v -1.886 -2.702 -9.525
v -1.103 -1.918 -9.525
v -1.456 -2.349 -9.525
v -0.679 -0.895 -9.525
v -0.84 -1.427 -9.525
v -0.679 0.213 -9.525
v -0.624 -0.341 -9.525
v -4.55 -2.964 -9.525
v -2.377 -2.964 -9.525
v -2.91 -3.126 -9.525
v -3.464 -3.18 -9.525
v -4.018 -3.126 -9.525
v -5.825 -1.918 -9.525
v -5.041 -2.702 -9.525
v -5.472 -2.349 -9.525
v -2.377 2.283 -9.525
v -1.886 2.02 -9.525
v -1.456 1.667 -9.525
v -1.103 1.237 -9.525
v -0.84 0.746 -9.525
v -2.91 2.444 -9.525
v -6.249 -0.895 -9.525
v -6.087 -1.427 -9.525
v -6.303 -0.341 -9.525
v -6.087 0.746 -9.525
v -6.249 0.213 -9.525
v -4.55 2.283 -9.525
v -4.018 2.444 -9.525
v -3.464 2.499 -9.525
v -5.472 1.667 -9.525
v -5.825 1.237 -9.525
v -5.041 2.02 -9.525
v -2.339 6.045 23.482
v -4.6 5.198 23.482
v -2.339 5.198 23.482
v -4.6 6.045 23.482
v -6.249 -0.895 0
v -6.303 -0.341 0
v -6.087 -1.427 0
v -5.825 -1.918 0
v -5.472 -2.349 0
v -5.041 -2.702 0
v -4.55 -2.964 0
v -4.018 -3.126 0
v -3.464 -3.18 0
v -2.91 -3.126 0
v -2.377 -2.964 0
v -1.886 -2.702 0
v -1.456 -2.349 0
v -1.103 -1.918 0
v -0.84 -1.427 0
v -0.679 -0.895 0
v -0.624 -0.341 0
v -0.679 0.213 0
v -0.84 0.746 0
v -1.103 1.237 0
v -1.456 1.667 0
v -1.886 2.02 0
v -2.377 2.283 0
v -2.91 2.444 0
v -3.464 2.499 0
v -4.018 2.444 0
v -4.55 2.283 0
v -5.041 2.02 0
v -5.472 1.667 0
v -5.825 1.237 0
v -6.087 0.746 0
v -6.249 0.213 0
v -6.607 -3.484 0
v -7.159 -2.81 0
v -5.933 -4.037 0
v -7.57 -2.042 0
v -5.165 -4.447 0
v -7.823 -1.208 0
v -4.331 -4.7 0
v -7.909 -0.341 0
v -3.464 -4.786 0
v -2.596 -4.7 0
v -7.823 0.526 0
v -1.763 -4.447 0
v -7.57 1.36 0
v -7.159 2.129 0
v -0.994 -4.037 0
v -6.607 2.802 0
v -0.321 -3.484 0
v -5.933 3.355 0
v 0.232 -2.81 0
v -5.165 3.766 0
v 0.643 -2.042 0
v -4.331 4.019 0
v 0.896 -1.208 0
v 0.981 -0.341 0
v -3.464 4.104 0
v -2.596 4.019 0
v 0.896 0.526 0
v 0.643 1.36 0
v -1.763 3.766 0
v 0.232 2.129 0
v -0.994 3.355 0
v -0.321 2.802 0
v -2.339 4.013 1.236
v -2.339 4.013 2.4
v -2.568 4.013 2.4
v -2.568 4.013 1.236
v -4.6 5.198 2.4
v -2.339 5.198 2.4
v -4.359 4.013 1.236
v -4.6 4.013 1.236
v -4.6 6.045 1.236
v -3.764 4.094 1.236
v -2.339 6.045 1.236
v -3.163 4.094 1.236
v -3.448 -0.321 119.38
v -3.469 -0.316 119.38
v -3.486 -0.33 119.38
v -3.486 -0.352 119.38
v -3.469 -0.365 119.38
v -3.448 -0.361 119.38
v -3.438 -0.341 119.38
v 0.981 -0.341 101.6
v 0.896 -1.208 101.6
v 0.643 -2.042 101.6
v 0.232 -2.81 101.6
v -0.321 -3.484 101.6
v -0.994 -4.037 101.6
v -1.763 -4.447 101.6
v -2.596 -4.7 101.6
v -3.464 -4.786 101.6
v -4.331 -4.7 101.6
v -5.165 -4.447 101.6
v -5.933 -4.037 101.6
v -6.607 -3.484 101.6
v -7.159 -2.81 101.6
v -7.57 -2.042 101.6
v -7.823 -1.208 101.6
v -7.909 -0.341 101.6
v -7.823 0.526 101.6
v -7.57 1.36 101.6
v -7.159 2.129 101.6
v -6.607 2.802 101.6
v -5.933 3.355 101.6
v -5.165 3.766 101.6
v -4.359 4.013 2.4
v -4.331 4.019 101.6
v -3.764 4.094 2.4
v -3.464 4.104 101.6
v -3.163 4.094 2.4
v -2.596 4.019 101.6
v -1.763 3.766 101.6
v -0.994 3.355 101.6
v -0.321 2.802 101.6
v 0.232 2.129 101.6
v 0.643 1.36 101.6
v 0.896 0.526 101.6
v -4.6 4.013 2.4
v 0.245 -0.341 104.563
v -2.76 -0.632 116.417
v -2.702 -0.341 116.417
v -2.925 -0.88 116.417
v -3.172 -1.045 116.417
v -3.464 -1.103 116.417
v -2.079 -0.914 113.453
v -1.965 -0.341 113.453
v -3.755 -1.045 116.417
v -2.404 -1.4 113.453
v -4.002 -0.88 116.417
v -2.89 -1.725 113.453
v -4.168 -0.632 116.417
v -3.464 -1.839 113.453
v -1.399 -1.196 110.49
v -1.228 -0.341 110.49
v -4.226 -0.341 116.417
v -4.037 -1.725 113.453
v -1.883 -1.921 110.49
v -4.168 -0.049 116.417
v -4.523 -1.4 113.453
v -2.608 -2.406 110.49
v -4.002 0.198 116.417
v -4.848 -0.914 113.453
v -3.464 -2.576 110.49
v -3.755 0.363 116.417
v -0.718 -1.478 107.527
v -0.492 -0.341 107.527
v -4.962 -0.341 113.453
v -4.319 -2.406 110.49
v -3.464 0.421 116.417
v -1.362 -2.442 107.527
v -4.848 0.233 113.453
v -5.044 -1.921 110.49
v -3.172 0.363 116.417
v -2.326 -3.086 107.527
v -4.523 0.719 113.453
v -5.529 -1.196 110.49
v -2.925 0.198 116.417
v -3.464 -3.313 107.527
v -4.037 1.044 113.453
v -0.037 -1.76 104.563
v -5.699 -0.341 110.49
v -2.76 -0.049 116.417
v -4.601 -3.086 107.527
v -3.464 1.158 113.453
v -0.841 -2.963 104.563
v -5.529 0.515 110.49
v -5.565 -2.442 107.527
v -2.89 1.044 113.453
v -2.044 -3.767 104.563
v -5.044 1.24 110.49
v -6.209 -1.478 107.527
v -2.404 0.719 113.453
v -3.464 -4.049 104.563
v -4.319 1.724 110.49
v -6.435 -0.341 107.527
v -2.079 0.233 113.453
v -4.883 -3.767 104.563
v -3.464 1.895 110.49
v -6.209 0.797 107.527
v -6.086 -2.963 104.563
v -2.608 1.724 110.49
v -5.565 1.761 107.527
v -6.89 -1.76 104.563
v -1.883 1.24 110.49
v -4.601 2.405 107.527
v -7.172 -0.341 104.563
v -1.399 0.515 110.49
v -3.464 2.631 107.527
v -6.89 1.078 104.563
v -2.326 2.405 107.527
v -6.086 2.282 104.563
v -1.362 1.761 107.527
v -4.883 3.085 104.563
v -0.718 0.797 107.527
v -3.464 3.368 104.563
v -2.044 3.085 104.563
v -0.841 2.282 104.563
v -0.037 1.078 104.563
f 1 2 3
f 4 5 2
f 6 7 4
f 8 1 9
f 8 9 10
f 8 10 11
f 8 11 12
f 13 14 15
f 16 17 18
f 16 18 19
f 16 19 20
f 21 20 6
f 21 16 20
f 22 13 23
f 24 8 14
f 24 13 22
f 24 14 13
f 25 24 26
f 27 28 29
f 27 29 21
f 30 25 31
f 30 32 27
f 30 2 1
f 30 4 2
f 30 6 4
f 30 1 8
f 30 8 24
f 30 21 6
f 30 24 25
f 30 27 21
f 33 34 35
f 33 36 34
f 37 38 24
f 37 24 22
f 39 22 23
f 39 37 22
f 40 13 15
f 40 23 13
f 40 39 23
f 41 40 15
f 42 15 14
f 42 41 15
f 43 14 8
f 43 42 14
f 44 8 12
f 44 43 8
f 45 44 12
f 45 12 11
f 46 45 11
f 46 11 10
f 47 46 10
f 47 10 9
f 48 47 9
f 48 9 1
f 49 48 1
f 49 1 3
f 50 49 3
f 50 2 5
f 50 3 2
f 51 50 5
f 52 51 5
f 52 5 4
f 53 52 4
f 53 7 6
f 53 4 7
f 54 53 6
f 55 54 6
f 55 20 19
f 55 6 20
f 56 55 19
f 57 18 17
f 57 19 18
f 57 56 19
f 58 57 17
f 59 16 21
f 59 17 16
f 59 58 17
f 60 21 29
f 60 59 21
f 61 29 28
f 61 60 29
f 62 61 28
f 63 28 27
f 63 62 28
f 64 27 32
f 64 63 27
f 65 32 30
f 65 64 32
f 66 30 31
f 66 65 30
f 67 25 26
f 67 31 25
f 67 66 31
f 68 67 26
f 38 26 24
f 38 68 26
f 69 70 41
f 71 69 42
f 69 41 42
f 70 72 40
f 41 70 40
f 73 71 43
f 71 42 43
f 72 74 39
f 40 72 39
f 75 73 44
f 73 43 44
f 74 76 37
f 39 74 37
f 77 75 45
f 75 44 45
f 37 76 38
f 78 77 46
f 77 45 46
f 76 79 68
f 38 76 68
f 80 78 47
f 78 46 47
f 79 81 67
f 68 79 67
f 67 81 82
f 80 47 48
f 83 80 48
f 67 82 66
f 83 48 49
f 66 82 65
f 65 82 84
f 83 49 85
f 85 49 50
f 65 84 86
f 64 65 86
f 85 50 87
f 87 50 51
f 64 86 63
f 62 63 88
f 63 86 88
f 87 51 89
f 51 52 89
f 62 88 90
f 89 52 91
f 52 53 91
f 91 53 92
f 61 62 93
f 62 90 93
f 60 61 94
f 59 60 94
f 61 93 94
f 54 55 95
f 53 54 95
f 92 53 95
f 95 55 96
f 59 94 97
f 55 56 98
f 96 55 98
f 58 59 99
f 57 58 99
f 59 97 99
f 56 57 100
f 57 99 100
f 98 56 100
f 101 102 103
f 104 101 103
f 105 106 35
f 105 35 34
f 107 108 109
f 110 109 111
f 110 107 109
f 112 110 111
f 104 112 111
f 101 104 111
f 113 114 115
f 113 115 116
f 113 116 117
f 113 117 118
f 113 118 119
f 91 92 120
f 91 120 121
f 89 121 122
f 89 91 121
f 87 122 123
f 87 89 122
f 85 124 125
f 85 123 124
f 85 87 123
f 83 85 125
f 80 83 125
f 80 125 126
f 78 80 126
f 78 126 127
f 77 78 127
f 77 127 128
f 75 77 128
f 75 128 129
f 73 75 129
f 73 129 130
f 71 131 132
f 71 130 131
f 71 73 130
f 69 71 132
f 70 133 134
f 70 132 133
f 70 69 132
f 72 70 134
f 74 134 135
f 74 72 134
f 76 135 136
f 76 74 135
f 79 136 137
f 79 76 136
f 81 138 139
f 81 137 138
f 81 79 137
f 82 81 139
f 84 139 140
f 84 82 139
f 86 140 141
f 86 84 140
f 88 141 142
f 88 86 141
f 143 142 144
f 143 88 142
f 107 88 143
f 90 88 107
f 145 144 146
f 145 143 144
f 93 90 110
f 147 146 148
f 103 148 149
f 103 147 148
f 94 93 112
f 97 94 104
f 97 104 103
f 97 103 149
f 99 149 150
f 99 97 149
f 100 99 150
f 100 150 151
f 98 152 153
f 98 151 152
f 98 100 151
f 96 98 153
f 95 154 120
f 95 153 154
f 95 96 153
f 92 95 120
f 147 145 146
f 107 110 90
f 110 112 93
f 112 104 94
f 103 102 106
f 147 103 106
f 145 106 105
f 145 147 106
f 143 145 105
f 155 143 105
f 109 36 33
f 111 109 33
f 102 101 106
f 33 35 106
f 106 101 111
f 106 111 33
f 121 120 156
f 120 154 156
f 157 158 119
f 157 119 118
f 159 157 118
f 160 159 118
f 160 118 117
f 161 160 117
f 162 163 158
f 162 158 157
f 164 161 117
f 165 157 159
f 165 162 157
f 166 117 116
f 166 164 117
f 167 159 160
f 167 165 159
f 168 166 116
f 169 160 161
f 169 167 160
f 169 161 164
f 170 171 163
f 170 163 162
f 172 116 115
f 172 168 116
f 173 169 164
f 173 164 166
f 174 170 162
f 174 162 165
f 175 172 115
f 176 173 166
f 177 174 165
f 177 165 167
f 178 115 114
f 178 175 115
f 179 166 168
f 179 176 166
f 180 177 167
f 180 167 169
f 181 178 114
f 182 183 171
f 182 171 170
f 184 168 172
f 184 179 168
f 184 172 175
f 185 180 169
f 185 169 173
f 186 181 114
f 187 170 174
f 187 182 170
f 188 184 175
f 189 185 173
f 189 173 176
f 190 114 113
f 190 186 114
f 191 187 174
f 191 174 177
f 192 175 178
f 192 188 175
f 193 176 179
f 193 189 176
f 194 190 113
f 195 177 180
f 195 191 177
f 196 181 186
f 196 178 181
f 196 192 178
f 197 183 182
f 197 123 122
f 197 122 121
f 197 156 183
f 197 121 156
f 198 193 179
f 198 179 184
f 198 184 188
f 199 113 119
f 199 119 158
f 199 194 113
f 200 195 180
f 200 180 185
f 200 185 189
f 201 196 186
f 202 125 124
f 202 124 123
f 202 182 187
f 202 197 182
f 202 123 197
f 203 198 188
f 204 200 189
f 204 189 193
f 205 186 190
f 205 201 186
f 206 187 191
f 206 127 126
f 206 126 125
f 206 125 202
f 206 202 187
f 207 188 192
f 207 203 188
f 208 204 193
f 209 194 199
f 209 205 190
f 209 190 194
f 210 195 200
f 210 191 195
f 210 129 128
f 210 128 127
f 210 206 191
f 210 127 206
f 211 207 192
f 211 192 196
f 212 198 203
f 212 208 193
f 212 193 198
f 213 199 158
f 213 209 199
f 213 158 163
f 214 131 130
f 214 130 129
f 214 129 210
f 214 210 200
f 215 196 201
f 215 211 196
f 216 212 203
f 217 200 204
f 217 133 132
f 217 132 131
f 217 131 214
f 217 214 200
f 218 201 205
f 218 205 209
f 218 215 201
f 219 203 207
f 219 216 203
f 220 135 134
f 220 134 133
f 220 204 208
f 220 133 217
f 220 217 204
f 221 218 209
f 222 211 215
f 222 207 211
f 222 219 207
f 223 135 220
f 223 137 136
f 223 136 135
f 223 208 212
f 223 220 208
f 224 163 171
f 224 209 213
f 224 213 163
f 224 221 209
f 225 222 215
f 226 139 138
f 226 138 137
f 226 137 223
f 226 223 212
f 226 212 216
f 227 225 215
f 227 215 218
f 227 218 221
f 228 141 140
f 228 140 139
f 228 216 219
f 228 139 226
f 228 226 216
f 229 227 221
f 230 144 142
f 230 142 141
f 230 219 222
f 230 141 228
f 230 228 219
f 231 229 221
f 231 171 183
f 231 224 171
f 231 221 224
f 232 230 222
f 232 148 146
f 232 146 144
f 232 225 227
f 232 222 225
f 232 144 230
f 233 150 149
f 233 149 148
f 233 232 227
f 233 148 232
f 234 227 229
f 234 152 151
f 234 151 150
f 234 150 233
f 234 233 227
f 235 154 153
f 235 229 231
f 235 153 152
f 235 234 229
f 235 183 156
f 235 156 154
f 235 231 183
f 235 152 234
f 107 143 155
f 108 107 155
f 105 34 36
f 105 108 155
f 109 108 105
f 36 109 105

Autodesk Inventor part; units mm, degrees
ref_plane "YZ Plane" through (0, 0, 0) normal (1, 0, 0) x (0, 1, 0)
sketch "Sketch1" plane through (0, 0, 0) normal (0, 0, 1) x (1, 0, 0)
  circle A0 centre (-3.4636, -0.3407) radius 4.445
  point P0 (0, 0)
  dimension "d0" = 8.89
extrude "Pen body" add sketch "Sketch1" along normal blind 101.6
ref_plane "Tip Plane" through (-3.4636, -0.3407, 119.38) normal (0, 0, 1) x (1, 0, 0)
sketch "Sketch2" plane through (-3.4636, -0.3407, 119.38) normal (0, 0, 1) x (1, 0, 0)
  circle A0 centre (0, 0) radius 0.0254
  point P0 (3.4636, 0.3407)
  dimension "d4" = 0.0508
loft "Body to Tip" add profiles "Sketch2" section 1 edges at (-7.9086, -0.3407, 101.6)
sketch "Sketch3" plane through (-3.4636, -0.3407, 0) normal (0, 0, -1) x (-1, 0, 0)
  point P0 (-3.4636, 0.3407)
sketch "Sketch4" plane through (-3.4636, -0.3407, 0) normal (0, 0, -1) x (-1, 0, 0)
  circle A0 centre (0, 0) radius 2.8396
  point P0 (-3.4636, 0.3407)
extrude "Click" add sketch "Sketch4" along normal blind 9.525
ref_plane "Clip" through (0, 4.0132, 0) normal (0, 1, 0) x (-1, 0, 0)
sketch "Clip extention" plane through (0, 4.0132, 0) normal (0, 1, 0) x (-1, 0, 0)
  point P0 (0, 0)
sketch "Clips extension's extension" plane through (0, 4.0132, 0) normal (0, 1, 0) x (-1, 0, 0)
  point P0 (0, 0)
sketch "Sketch7" plane through (0, 4.0132, 0) normal (0, 1, 0) x (-1, 0, 0)
  line L0 (4.5996, 1.2363) -> (2.3394, 1.2363)
  line L1 (2.3394, 1.2363) -> (2.3394, 2.4001)
  line L2 (2.3394, 2.4001) -> (4.5996, 2.4001)
  line L3 (4.5996, 2.4001) -> (4.5996, 1.2363)
  point P0 (0, 0)
extrude "Extrusion3" add sketch "Sketch7" along normal blind 2.032
sketch "Sketch8" plane through (-4.5996, 4.0132, 2.4001) normal (0, 0, 1) x (1, 0, 0)
  line L0 (0, 0) -> (0, 2.032) projected
  line L1 (2.2602, 0) -> (2.2602, 2.032) projected
  line L2 (0, 2.032) -> (2.2602, 2.032)
  line L3 (2.2602, 2.032) -> (2.2602, 1.1849)
  line L4 (2.2602, 1.1849) -> (0, 1.1849)
  line L5 (0, 1.1849) -> (0, 2.032)
  point P0 (4.5996, -4.0132)
extrude "Extrusion4" add sketch "Sketch8" along normal blind 21.082
properties part number "Pen"
